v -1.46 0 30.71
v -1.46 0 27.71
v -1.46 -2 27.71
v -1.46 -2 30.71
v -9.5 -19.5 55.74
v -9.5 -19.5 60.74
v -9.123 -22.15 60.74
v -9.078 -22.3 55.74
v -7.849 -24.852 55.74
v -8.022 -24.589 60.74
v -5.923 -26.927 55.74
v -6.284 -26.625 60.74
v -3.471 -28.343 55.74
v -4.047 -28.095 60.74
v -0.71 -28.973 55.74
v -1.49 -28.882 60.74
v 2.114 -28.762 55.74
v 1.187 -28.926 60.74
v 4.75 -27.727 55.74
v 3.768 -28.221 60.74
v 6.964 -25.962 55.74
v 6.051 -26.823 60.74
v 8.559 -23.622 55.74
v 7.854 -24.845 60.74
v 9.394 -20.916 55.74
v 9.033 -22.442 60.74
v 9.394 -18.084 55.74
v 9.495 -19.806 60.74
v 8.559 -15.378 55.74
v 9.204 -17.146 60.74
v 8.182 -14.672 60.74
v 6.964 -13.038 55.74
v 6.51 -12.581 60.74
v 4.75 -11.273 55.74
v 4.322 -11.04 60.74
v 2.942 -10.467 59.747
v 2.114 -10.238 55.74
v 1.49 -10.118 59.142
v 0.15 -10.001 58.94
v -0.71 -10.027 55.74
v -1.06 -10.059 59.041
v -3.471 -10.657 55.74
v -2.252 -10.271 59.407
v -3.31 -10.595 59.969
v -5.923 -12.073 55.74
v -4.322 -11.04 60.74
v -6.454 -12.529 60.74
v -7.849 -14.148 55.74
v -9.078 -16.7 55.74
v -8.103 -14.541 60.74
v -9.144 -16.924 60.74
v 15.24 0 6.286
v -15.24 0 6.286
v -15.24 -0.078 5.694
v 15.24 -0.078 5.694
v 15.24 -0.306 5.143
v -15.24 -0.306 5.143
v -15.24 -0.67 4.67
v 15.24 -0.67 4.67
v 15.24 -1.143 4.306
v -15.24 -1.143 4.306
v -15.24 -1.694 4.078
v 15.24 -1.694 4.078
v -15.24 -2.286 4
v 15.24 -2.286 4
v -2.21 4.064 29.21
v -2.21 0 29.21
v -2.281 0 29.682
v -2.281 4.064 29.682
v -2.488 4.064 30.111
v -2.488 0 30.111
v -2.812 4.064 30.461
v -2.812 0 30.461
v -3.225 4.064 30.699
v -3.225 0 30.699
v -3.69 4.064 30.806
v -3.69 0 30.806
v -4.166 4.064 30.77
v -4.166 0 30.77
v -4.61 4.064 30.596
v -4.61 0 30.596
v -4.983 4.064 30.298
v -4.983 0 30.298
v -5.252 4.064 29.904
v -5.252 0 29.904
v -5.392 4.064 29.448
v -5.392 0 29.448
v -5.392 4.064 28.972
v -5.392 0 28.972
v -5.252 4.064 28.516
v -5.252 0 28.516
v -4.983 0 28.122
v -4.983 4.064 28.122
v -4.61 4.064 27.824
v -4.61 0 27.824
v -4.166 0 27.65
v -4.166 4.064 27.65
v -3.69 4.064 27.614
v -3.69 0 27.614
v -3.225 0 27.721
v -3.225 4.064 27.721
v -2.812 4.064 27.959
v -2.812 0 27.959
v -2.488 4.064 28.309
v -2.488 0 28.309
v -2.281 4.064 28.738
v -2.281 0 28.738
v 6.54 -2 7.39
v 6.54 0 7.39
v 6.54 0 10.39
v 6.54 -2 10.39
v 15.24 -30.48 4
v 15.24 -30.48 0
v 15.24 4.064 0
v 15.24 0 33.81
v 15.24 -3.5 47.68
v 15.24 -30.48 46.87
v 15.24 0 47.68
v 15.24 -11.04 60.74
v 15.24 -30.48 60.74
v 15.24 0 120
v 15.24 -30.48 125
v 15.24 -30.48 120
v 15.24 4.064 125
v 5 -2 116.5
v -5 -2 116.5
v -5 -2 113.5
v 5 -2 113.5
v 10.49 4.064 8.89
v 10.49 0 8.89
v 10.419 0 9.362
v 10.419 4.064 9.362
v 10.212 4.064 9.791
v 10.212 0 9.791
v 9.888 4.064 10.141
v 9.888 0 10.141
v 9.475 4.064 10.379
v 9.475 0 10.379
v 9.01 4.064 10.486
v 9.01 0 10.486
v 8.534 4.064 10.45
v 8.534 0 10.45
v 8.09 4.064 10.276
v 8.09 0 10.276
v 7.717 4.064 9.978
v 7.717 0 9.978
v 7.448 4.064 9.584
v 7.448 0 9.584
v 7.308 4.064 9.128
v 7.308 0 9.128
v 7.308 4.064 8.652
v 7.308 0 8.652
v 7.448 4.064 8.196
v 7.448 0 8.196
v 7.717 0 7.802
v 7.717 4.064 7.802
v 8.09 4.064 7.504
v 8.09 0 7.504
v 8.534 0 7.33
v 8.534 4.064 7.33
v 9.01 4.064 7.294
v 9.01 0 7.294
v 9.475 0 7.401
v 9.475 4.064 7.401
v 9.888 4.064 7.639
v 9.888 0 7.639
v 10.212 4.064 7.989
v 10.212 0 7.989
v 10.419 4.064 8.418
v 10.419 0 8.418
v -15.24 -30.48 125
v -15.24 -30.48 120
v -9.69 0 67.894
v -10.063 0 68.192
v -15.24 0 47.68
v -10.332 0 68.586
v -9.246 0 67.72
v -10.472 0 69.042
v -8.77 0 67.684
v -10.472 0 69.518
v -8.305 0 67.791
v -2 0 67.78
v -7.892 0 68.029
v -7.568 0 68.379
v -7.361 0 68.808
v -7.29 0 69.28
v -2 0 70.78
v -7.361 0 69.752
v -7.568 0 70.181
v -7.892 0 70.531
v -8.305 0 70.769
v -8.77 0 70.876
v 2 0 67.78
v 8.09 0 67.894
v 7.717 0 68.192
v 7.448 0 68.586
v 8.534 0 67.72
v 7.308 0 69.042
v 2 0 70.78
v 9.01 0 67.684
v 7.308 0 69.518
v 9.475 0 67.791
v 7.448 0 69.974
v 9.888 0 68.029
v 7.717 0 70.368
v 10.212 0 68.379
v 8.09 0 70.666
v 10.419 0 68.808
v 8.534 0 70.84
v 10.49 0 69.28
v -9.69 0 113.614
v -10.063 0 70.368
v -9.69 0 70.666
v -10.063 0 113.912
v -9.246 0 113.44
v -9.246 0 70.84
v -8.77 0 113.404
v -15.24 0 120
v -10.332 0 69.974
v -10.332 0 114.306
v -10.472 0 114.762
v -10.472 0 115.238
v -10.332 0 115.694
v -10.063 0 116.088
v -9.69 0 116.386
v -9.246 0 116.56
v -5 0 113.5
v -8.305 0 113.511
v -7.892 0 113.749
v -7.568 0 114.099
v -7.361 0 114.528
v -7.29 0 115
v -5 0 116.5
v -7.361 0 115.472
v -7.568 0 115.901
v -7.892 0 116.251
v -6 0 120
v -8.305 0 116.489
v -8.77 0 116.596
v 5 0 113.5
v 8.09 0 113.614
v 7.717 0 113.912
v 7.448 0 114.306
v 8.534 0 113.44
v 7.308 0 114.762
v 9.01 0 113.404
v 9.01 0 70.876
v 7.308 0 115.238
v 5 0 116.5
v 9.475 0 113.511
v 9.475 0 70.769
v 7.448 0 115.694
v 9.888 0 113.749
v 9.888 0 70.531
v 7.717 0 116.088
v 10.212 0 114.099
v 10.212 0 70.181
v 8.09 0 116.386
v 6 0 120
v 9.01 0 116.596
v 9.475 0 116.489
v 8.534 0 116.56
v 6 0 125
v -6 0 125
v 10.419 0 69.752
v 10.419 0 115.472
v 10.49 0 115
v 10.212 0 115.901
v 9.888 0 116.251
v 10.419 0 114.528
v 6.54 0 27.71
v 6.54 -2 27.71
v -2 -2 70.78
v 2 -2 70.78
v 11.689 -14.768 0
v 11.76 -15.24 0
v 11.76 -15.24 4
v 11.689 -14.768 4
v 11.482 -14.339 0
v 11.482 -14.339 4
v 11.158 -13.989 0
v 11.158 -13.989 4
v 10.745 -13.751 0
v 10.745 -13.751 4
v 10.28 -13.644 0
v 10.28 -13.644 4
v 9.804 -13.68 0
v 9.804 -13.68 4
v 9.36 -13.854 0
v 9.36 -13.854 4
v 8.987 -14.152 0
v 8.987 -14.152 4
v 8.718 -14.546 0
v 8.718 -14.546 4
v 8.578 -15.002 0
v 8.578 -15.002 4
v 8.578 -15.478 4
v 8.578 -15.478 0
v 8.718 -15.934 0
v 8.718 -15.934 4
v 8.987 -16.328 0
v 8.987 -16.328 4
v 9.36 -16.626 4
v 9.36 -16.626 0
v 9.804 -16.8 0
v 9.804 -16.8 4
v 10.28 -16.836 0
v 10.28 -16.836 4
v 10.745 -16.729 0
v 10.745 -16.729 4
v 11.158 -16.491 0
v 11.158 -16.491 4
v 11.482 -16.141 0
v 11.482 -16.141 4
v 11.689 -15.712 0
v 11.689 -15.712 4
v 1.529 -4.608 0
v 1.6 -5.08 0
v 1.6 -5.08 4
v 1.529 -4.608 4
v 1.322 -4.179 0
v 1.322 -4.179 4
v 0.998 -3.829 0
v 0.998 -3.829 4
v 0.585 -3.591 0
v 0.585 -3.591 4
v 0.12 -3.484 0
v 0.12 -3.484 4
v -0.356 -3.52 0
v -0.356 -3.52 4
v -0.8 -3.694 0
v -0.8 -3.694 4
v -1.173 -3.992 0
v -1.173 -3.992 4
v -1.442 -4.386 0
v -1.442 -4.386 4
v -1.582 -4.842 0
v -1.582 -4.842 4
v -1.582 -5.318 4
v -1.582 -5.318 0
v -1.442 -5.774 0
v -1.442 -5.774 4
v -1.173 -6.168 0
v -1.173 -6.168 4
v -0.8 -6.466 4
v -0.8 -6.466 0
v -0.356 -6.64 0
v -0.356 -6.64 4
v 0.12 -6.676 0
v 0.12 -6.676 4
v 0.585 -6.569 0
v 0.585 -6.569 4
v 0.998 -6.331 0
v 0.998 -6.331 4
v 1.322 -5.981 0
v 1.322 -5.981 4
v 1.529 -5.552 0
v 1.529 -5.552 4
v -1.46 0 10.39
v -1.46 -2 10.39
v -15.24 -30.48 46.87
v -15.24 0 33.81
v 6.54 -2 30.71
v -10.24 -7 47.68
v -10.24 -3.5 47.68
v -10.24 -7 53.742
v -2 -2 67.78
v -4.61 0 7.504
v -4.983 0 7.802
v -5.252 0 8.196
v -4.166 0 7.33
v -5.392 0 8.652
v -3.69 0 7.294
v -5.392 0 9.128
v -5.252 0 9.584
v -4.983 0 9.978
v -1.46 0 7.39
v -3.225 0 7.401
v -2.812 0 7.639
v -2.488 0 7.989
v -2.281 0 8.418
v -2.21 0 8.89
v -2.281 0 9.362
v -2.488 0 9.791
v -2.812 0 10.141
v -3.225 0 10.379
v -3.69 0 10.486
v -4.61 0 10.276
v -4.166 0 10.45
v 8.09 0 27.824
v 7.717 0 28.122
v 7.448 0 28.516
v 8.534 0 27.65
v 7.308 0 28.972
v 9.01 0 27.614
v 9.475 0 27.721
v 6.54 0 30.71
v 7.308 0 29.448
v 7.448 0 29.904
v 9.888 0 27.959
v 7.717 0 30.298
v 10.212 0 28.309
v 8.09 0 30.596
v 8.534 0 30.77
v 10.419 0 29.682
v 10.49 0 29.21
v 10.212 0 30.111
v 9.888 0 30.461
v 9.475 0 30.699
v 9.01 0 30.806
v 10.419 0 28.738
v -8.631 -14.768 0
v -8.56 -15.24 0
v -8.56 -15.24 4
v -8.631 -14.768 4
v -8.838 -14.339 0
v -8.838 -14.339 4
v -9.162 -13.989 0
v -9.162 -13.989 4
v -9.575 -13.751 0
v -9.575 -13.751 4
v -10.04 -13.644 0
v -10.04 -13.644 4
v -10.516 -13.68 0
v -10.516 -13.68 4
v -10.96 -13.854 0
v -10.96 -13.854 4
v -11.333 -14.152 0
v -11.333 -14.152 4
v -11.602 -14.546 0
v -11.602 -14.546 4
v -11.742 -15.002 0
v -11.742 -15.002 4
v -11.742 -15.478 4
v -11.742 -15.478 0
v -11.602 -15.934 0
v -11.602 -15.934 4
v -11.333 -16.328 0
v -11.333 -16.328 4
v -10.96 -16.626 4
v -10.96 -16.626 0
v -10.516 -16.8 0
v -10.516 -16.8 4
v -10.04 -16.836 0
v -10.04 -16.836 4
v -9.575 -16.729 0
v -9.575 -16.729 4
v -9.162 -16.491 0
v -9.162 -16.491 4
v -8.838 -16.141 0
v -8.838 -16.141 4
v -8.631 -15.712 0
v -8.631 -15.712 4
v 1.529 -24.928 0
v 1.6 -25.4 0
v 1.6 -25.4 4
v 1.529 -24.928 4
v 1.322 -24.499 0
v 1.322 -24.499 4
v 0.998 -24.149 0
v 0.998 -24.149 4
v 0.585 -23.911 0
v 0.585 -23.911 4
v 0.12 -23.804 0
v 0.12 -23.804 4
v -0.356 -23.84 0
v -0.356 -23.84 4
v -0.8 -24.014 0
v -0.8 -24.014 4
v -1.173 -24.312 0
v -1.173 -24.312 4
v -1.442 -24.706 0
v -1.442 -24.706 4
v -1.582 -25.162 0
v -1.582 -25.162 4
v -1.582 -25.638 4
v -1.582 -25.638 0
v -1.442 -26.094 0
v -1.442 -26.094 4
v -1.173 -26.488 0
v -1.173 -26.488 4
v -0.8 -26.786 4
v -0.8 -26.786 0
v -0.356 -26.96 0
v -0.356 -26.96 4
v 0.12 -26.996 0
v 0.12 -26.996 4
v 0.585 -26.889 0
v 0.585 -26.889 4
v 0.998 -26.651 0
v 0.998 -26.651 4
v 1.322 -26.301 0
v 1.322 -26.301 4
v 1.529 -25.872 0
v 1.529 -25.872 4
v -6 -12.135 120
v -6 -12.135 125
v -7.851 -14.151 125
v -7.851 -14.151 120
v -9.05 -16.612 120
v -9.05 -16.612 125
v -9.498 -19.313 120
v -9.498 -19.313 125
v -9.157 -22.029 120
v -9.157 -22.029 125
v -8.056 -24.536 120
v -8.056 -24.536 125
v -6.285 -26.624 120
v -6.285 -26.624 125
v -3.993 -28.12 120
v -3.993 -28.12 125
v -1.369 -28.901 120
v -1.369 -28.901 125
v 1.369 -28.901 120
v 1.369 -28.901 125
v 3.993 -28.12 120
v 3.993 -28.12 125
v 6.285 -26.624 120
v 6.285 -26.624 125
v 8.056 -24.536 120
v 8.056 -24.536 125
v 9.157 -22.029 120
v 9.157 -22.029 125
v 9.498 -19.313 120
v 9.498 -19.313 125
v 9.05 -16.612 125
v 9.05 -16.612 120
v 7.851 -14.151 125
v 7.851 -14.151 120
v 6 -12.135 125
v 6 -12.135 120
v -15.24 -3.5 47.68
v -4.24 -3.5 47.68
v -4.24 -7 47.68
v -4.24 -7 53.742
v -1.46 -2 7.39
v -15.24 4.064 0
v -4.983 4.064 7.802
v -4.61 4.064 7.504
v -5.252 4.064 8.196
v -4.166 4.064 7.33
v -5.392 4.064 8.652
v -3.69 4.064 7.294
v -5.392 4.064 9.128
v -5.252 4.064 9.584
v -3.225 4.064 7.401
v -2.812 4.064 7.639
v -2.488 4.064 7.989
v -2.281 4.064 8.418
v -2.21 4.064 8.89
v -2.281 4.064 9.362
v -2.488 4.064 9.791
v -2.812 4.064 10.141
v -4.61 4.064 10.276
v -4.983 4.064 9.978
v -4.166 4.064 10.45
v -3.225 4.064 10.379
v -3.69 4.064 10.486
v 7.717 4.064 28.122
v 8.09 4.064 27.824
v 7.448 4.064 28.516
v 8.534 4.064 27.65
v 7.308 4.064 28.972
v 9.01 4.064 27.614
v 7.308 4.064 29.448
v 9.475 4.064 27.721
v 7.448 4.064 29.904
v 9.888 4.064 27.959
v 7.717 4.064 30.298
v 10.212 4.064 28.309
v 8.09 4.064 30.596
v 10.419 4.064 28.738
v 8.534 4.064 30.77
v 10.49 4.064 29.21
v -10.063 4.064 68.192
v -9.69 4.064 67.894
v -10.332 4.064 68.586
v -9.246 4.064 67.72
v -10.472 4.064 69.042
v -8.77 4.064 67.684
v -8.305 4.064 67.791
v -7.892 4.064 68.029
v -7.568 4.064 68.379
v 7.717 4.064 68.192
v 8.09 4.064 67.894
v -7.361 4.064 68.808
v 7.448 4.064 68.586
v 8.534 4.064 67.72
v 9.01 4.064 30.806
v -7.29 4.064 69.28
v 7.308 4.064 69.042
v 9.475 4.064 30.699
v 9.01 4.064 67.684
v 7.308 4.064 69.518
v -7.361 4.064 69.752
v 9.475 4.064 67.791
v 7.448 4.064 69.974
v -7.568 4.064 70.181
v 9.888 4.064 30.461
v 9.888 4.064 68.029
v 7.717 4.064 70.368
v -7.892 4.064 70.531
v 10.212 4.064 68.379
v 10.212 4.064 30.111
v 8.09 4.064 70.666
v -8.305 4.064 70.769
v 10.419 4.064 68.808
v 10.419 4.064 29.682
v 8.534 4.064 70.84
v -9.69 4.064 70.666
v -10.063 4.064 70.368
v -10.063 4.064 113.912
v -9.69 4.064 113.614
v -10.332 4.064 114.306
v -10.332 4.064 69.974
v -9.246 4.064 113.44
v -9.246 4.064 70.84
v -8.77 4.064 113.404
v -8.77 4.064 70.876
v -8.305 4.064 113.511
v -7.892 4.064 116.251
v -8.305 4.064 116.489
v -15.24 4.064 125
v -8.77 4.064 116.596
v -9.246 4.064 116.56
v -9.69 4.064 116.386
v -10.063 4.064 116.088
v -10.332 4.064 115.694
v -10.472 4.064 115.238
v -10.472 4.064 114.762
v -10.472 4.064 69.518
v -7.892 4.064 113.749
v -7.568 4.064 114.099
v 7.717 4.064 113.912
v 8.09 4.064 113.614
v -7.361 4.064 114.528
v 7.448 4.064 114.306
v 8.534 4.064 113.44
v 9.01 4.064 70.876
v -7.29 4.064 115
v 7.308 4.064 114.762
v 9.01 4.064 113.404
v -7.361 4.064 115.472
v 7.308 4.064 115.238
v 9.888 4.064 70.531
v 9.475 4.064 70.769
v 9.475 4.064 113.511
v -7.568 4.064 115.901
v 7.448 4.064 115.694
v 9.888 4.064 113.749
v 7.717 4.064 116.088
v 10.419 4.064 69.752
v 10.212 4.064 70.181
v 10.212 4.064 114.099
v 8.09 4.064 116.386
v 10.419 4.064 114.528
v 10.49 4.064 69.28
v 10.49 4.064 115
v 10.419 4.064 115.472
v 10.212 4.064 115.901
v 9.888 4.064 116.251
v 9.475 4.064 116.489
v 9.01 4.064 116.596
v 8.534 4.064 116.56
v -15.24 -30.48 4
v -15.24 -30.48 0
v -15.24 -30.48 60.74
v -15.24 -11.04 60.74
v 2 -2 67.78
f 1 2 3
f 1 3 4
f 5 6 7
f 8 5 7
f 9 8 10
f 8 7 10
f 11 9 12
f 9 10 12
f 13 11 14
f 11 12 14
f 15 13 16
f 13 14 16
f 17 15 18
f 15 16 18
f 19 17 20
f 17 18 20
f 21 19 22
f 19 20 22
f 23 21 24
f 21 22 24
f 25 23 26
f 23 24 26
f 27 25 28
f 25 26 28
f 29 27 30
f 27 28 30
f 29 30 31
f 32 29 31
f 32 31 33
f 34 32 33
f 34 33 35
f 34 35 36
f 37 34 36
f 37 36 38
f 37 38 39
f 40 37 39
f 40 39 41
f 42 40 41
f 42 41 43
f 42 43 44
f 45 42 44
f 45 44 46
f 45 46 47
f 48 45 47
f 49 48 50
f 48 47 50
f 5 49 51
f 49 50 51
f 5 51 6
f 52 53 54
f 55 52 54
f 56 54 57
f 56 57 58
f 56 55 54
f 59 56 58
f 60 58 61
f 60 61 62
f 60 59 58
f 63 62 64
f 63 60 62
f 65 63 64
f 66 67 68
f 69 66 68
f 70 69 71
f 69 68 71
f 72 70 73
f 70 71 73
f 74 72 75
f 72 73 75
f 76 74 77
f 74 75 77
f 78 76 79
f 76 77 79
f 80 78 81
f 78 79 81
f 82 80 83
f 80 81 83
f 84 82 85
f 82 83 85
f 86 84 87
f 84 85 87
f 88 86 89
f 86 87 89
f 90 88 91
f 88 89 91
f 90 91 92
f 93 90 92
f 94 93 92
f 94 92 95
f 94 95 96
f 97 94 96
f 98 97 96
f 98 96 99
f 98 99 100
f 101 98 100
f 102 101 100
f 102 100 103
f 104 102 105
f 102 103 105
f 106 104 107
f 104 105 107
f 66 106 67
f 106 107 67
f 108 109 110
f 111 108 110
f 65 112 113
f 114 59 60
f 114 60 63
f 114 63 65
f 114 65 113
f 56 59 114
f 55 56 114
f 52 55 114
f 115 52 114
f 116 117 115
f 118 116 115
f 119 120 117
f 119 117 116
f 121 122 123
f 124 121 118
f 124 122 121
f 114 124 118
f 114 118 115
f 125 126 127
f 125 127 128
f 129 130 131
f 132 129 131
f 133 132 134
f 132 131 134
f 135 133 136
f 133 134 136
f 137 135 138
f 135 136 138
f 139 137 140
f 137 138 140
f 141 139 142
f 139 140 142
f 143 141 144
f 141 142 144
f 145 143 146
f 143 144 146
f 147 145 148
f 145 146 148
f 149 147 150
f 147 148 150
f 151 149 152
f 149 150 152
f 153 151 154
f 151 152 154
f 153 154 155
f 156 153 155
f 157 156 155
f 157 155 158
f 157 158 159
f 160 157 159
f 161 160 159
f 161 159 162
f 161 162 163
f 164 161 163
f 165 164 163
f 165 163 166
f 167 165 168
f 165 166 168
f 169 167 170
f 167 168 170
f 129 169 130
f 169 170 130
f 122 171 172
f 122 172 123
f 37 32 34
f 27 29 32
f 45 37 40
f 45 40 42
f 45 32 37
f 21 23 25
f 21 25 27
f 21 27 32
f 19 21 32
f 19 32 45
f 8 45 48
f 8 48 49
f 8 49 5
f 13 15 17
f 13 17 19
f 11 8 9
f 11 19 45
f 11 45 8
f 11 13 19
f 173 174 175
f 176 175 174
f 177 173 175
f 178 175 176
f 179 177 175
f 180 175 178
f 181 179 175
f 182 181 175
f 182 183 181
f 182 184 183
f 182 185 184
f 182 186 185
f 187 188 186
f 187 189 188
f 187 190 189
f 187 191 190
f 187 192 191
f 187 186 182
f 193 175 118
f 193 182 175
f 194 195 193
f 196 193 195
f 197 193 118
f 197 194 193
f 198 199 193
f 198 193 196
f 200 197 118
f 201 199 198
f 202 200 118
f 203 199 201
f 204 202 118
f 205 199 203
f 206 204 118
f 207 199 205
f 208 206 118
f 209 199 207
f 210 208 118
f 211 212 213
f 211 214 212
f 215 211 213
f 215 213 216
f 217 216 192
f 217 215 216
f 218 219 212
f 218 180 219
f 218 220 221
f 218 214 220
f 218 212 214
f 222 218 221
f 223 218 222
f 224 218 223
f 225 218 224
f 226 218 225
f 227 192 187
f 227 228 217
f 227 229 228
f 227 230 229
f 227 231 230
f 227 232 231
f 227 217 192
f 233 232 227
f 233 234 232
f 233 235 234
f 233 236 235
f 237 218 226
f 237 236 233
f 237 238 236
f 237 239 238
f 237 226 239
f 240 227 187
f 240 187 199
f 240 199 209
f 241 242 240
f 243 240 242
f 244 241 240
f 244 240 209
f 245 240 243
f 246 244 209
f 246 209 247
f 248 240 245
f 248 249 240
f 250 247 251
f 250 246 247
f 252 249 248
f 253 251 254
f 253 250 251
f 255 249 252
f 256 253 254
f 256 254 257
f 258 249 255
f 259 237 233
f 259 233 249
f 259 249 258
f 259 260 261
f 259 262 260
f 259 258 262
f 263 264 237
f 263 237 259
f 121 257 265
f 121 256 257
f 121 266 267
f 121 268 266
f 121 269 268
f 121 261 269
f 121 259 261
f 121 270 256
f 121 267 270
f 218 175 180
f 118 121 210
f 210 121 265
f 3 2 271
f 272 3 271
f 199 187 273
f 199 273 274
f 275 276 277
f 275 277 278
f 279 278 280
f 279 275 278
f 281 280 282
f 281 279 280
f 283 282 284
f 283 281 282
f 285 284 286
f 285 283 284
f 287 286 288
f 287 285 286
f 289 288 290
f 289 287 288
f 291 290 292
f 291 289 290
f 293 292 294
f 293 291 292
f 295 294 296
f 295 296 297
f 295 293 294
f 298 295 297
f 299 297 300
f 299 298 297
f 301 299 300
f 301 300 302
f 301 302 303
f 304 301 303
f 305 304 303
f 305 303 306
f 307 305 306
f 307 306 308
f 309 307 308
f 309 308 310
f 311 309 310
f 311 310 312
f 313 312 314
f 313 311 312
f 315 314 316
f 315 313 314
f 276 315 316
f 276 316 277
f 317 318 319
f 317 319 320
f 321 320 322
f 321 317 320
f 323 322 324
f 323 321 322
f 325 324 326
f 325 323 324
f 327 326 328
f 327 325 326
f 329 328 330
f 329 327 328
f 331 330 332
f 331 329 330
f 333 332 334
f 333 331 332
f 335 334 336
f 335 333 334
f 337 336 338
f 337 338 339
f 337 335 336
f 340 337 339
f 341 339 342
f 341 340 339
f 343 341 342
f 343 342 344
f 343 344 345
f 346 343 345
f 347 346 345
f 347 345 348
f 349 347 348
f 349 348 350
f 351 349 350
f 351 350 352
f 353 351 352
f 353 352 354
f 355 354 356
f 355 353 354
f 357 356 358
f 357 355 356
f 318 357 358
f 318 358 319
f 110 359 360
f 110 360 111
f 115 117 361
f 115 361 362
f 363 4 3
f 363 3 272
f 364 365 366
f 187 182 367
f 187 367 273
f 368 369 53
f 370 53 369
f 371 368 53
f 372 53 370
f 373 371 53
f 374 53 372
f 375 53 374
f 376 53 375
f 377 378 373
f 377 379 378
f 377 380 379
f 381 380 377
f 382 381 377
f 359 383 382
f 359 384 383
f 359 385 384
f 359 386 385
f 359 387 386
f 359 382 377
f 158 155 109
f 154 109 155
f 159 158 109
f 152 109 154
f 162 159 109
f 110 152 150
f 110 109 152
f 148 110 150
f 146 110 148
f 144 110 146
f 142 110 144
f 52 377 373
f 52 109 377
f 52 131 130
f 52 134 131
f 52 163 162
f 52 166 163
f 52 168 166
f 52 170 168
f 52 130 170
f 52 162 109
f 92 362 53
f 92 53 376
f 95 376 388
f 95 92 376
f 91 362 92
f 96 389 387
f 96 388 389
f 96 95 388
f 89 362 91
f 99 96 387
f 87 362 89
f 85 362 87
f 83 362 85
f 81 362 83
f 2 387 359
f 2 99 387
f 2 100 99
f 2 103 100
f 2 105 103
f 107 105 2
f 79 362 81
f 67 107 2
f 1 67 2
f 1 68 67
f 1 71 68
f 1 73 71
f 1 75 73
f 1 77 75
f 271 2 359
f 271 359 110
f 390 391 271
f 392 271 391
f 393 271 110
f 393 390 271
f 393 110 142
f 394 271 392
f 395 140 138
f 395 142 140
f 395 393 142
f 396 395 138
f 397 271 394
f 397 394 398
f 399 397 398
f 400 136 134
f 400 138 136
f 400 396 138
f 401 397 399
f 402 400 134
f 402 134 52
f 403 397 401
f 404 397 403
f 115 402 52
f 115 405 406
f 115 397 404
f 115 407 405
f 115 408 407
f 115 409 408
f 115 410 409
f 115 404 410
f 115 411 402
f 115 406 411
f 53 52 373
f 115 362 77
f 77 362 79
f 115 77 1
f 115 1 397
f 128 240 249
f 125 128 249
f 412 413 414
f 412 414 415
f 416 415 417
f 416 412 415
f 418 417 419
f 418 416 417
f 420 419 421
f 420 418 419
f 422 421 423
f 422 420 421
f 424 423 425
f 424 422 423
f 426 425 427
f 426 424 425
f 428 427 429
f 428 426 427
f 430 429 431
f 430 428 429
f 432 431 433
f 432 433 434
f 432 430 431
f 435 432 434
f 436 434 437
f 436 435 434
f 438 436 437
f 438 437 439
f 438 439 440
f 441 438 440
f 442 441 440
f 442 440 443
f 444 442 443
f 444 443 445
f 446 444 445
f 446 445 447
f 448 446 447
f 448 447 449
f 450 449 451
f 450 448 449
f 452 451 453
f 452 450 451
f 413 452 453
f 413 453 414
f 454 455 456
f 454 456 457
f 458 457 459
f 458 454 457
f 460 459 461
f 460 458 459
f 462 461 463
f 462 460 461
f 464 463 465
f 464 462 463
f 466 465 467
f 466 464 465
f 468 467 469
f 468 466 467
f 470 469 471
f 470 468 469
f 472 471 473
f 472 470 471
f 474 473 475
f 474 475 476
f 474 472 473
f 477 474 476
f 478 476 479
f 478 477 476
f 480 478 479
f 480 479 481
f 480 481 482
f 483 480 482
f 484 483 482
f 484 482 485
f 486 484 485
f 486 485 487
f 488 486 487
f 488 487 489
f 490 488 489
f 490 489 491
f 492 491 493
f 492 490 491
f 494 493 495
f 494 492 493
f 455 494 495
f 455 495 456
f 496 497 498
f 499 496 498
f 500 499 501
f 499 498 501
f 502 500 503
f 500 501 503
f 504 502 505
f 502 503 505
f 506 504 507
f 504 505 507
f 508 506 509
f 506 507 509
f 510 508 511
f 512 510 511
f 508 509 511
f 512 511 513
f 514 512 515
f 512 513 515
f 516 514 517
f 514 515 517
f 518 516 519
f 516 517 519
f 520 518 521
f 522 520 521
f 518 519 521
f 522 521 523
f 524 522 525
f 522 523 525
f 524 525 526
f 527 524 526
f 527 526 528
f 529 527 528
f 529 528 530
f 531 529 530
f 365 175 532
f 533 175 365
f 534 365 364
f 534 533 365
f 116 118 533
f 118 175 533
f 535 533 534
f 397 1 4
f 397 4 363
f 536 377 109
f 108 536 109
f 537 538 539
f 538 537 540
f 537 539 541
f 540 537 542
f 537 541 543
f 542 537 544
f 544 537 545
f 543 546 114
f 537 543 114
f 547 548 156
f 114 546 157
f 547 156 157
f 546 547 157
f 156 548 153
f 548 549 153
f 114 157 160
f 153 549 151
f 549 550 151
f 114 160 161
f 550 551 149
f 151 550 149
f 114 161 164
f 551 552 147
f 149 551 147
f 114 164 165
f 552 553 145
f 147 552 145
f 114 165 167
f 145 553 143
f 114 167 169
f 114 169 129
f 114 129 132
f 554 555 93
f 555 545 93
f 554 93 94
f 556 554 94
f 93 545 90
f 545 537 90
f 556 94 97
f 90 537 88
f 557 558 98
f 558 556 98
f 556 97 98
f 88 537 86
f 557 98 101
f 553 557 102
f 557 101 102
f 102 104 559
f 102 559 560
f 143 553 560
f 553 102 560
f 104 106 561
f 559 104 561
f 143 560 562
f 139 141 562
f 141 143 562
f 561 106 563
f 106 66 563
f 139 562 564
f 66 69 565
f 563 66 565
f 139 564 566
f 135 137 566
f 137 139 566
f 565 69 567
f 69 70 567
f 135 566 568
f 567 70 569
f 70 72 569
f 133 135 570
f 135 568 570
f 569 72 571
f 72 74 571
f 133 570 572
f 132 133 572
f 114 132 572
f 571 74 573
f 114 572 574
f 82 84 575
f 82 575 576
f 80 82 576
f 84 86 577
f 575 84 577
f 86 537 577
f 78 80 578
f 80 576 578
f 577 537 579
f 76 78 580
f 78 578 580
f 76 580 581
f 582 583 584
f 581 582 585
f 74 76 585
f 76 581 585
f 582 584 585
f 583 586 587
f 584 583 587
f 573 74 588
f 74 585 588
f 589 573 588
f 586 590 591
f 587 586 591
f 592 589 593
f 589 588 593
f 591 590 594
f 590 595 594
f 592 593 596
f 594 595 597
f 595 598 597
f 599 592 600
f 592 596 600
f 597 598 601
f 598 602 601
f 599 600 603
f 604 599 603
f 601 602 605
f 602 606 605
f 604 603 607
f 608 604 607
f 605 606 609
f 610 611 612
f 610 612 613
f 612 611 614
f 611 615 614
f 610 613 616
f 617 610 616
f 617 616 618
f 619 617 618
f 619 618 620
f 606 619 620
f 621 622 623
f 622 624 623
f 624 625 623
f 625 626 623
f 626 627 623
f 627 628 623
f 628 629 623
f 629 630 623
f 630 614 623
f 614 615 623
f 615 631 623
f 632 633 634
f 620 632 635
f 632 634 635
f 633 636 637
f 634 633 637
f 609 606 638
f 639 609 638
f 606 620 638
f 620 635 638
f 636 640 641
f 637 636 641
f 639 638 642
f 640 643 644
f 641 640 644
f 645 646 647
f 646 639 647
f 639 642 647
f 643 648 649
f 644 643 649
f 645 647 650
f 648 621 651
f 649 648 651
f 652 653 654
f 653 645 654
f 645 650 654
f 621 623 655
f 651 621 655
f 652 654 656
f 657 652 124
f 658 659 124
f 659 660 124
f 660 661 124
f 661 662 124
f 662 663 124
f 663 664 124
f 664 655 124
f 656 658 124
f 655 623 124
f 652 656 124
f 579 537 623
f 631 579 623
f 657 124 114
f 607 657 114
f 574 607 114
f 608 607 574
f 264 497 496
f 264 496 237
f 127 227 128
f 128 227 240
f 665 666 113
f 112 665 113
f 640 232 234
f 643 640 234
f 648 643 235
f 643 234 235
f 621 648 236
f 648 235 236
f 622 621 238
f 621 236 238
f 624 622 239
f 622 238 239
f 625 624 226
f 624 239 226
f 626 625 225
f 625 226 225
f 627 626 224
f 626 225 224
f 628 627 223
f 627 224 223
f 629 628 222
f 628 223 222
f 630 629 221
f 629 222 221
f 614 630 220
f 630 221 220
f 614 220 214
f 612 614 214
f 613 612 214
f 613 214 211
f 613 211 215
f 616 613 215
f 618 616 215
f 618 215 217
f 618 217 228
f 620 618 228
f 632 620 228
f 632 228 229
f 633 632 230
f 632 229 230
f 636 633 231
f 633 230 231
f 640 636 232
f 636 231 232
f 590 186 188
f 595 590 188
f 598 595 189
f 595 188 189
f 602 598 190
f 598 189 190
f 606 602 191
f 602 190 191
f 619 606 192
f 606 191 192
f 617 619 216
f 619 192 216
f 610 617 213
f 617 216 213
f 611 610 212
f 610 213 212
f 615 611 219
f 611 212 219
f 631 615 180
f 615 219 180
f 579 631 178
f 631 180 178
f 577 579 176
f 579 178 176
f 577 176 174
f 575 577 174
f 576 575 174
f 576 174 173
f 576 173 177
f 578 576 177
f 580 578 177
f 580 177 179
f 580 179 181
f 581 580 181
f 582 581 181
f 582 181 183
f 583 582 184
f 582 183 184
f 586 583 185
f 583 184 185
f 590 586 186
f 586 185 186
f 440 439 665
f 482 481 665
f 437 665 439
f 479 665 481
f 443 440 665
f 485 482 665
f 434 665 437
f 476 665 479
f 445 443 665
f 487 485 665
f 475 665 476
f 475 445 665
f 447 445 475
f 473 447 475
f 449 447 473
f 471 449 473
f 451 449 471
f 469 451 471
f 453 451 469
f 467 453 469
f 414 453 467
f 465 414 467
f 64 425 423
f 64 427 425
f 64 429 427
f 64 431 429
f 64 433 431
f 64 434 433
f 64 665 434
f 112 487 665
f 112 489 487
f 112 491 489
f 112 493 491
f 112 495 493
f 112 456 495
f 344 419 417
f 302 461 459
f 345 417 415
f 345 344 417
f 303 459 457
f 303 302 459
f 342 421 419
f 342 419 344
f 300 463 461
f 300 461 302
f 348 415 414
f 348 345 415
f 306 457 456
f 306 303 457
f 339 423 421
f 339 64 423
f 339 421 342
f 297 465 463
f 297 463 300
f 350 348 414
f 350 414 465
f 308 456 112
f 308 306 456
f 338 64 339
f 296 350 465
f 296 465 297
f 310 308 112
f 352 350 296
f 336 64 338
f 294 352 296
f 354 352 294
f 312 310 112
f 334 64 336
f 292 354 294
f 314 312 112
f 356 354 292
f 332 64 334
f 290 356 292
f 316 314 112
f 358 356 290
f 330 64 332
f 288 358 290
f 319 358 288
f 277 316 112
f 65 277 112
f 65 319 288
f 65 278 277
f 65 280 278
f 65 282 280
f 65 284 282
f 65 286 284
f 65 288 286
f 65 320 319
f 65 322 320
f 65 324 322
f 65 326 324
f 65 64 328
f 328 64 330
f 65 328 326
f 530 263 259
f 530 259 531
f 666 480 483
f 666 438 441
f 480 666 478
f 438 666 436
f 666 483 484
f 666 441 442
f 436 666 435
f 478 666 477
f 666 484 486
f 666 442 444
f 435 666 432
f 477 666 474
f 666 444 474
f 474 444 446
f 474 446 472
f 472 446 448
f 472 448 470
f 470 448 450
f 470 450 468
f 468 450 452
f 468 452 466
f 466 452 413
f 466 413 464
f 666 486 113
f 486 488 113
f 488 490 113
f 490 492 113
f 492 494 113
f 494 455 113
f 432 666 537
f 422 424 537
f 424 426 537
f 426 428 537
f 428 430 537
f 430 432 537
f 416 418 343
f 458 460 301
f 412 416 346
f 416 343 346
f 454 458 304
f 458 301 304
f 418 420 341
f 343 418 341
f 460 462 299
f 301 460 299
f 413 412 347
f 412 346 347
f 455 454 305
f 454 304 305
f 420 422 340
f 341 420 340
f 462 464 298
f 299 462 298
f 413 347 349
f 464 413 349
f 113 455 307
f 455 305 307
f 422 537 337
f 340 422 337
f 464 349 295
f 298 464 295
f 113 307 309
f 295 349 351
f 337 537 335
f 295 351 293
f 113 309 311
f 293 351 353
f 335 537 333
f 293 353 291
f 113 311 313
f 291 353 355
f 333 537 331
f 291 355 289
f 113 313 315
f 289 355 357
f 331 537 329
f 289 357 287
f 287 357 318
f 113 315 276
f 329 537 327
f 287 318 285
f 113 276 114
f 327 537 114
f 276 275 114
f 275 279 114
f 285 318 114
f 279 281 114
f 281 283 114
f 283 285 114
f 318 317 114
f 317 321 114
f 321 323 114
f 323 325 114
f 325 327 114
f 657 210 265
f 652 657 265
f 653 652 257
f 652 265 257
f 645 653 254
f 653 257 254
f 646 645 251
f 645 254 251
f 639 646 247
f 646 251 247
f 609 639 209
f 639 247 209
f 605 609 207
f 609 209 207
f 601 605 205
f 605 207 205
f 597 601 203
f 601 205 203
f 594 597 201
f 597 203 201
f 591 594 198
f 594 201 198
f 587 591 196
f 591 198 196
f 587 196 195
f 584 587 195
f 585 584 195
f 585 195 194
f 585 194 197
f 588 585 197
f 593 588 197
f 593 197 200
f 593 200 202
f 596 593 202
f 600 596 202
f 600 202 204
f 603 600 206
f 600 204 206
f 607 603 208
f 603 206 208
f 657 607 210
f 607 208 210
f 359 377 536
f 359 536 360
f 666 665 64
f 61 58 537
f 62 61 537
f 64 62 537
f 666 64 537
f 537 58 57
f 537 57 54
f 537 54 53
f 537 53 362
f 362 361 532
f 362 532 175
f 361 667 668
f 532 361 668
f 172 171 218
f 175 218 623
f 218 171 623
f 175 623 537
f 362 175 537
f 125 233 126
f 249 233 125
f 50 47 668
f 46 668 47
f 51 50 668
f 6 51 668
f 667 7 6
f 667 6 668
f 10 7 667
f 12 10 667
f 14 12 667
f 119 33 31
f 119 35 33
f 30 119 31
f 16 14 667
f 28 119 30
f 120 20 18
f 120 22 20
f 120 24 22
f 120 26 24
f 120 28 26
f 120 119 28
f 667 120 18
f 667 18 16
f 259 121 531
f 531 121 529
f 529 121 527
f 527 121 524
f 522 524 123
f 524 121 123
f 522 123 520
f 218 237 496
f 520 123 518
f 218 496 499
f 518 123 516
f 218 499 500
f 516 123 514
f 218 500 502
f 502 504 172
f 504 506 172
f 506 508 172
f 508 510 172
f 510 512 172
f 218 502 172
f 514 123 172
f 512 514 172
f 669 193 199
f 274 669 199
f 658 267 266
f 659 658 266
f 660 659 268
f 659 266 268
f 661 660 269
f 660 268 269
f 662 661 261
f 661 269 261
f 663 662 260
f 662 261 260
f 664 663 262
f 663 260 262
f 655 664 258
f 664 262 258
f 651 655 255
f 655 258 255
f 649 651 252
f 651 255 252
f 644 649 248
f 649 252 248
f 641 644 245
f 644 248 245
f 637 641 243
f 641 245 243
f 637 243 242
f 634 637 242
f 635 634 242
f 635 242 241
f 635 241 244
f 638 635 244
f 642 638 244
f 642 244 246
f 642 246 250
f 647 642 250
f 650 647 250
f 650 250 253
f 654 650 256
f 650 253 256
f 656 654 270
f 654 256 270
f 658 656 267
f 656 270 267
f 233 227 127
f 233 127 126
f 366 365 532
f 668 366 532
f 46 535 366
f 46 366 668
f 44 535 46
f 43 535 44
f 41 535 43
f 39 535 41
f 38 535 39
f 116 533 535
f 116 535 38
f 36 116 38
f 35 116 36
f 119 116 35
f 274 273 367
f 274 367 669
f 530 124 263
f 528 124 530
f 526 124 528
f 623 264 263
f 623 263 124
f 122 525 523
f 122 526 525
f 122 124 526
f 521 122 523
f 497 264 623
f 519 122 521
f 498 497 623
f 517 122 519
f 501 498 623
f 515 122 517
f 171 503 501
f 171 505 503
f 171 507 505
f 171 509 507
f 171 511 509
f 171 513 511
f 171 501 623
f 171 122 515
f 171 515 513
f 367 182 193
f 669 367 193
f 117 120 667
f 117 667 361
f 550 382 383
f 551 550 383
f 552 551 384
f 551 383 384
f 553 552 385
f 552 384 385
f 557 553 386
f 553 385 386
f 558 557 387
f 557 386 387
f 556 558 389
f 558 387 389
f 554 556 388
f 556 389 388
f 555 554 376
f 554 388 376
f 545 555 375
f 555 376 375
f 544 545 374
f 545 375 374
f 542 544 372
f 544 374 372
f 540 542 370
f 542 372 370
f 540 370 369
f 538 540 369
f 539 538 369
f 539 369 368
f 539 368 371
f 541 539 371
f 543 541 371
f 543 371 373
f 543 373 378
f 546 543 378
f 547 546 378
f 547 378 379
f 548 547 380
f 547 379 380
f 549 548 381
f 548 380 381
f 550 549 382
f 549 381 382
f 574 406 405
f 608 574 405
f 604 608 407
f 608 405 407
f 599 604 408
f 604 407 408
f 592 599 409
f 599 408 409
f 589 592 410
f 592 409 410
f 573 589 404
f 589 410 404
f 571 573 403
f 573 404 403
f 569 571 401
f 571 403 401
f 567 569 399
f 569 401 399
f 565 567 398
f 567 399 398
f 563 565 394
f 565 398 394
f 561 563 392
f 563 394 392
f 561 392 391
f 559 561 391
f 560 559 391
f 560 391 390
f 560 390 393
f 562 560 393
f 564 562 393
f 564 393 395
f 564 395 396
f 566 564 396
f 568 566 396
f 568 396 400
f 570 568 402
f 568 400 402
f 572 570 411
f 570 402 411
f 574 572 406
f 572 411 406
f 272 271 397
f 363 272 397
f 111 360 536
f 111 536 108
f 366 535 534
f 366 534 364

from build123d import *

# Parameters (mm, degrees)
SKETCH_W          = 30.48
SKETCH_H          = 125
SKETCH_R          = 1.6
PAD_DEPTH         = 4.064
SKETCH001_W       = 30.48
SKETCH001_H       = 30.48
SKETCH001_R       = 1.6
PAD001_DEPTH      = 4
FILLET_R          = 2.286
PAD002_DEPTH      = 5
SKETCH003_W       = 4
SKETCH003_H       = 3
SKETCH003_W_2     = 10
PAD003_DEPTH      = 2
PAD004_DEPTH      = 15.24
PAD004_DEPTH_BACK = 15.24
SKETCH005_R       = 9.5
POCKET_DEPTH      = 5
SKETCH006_W       = 8
SKETCH006_H       = 3
PAD005_DEPTH      = 2
SKETCH007_W       = 6
SKETCH007_H       = 7
POCKET001_DEPTH   = 10


with BuildPart() as part:
    # Sketch → Pad (new body)
    with BuildSketch(Plane.XZ):
        with Locations((0, 62.5)):
            Rectangle(SKETCH_W, SKETCH_H)
        with Locations((-8.89, 69.28)):
            Circle(SKETCH_R, mode=Mode.SUBTRACT)
        with Locations((8.89, 69.28)):
            Circle(SKETCH_R, mode=Mode.SUBTRACT)
        with Locations((-8.89, 115)):
            Circle(SKETCH_R, mode=Mode.SUBTRACT)
        with Locations((8.89, 115)):
            Circle(SKETCH_R, mode=Mode.SUBTRACT)
        with Locations((-3.81, 29.21)):
            Circle(SKETCH_R, mode=Mode.SUBTRACT)
        with Locations((8.89, 29.21)):
            Circle(SKETCH_R, mode=Mode.SUBTRACT)
        with Locations((-3.81, 8.89)):
            Circle(SKETCH_R, mode=Mode.SUBTRACT)
        with Locations((8.89, 8.89)):
            Circle(SKETCH_R, mode=Mode.SUBTRACT)
    extrude(amount=-PAD_DEPTH)

    # Sketch001 → Pad001 (join)
    with BuildSketch(Plane.XY):
        with Locations((0, -15.24)):
            Rectangle(SKETCH001_W, SKETCH001_H)
        with Locations((0, -5.08)):
            Circle(SKETCH001_R, mode=Mode.SUBTRACT)
        with Locations((0, -25.4)):
            Circle(SKETCH001_R, mode=Mode.SUBTRACT)
        with Locations((10.16, -15.24)):
            Circle(SKETCH001_R, mode=Mode.SUBTRACT)
        with Locations((-10.16, -15.24)):
            Circle(SKETCH001_R, mode=Mode.SUBTRACT)
    extrude(amount=PAD001_DEPTH)

    # Fillet
    fillet_edges = [part.edges().sort_by_distance(p)[0] for p in [
        (0, 0, 4),
    ]]
    fillet(fillet_edges, radius=FILLET_R)

    # Sketch002 (on Face6 of Pad001) → Pad002 (join)
    with BuildSketch(Plane(origin=(0, 0, 125), x_dir=(-1, 0, 0), z_dir=(0, 0, 1))):
        with BuildLine():
            Line((-15.24, 30.48), (-15.24, 0))
            Line((-15.24, 0), (-6, 0))
            Line((-6, 0), (-6, 12.13454))
            ThreePointArc((6, 12.13454), (0, 29), (-6, 12.13454))
            Line((6, 12.13454), (6, 0))
            Line((6, 0), (15.24, 0))
            Line((15.24, 0), (15.24, 30.48))
            Line((15.24, 30.48), (-15.24, 30.48))
        make_face()
    extrude(amount=-PAD002_DEPTH)

    # Sketch003 (on Face3 of Pad002) → Pad003 (join)
    with BuildSketch(Plane.XZ):
        with Locations((0, 69.28)):
            Rectangle(SKETCH003_W, SKETCH003_H)
        with Locations((0, 115)):
            Rectangle(SKETCH003_W_2, SKETCH003_H)
    extrude(amount=PAD003_DEPTH)

    # Sketch004 → Pad004 (join, two sides)
    with BuildSketch(Plane.YZ) as pad004_sk:
        Polygon((0, 47.68), (-3.5, 47.68), (-11.040195, 60.74), (-30.48, 60.74), (-30.48, 46.87), (0, 33.81), align=None)
    extrude(amount=PAD004_DEPTH)
    extrude(pad004_sk.sketch, amount=-PAD004_DEPTH_BACK)

    # Sketch005 (on Face30 of Pad004) → Pocket (cut)
    with BuildSketch(Plane(origin=(0, 0, 60.74), x_dir=(-1, 0, 0), z_dir=(0, 0, 1))):
        with Locations((0, 19.5)):
            Circle(SKETCH005_R)
    extrude(amount=-POCKET_DEPTH, mode=Mode.SUBTRACT)

    # Sketch006 (on Face5 of Pocket) → Pad005 (join)
    with BuildSketch(Plane.XZ):
        with Locations((2.54, 29.21)):
            Rectangle(SKETCH006_W, SKETCH006_H)
        with Locations((2.54, 8.89)):
            Rectangle(SKETCH006_W, SKETCH006_H)
    extrude(amount=PAD005_DEPTH)

    # Sketch007 (on Face16 of Pad005) → Pocket001 (cut)
    with BuildSketch(Plane(origin=(0, 0, 47.68), x_dir=(-1, 0, 0), z_dir=(0, 0, 1))):
        with Locations((7.24, 3.5)):
            Rectangle(SKETCH007_W, SKETCH007_H)
    extrude(amount=POCKET001_DEPTH, mode=Mode.SUBTRACT)


solid = part.part
